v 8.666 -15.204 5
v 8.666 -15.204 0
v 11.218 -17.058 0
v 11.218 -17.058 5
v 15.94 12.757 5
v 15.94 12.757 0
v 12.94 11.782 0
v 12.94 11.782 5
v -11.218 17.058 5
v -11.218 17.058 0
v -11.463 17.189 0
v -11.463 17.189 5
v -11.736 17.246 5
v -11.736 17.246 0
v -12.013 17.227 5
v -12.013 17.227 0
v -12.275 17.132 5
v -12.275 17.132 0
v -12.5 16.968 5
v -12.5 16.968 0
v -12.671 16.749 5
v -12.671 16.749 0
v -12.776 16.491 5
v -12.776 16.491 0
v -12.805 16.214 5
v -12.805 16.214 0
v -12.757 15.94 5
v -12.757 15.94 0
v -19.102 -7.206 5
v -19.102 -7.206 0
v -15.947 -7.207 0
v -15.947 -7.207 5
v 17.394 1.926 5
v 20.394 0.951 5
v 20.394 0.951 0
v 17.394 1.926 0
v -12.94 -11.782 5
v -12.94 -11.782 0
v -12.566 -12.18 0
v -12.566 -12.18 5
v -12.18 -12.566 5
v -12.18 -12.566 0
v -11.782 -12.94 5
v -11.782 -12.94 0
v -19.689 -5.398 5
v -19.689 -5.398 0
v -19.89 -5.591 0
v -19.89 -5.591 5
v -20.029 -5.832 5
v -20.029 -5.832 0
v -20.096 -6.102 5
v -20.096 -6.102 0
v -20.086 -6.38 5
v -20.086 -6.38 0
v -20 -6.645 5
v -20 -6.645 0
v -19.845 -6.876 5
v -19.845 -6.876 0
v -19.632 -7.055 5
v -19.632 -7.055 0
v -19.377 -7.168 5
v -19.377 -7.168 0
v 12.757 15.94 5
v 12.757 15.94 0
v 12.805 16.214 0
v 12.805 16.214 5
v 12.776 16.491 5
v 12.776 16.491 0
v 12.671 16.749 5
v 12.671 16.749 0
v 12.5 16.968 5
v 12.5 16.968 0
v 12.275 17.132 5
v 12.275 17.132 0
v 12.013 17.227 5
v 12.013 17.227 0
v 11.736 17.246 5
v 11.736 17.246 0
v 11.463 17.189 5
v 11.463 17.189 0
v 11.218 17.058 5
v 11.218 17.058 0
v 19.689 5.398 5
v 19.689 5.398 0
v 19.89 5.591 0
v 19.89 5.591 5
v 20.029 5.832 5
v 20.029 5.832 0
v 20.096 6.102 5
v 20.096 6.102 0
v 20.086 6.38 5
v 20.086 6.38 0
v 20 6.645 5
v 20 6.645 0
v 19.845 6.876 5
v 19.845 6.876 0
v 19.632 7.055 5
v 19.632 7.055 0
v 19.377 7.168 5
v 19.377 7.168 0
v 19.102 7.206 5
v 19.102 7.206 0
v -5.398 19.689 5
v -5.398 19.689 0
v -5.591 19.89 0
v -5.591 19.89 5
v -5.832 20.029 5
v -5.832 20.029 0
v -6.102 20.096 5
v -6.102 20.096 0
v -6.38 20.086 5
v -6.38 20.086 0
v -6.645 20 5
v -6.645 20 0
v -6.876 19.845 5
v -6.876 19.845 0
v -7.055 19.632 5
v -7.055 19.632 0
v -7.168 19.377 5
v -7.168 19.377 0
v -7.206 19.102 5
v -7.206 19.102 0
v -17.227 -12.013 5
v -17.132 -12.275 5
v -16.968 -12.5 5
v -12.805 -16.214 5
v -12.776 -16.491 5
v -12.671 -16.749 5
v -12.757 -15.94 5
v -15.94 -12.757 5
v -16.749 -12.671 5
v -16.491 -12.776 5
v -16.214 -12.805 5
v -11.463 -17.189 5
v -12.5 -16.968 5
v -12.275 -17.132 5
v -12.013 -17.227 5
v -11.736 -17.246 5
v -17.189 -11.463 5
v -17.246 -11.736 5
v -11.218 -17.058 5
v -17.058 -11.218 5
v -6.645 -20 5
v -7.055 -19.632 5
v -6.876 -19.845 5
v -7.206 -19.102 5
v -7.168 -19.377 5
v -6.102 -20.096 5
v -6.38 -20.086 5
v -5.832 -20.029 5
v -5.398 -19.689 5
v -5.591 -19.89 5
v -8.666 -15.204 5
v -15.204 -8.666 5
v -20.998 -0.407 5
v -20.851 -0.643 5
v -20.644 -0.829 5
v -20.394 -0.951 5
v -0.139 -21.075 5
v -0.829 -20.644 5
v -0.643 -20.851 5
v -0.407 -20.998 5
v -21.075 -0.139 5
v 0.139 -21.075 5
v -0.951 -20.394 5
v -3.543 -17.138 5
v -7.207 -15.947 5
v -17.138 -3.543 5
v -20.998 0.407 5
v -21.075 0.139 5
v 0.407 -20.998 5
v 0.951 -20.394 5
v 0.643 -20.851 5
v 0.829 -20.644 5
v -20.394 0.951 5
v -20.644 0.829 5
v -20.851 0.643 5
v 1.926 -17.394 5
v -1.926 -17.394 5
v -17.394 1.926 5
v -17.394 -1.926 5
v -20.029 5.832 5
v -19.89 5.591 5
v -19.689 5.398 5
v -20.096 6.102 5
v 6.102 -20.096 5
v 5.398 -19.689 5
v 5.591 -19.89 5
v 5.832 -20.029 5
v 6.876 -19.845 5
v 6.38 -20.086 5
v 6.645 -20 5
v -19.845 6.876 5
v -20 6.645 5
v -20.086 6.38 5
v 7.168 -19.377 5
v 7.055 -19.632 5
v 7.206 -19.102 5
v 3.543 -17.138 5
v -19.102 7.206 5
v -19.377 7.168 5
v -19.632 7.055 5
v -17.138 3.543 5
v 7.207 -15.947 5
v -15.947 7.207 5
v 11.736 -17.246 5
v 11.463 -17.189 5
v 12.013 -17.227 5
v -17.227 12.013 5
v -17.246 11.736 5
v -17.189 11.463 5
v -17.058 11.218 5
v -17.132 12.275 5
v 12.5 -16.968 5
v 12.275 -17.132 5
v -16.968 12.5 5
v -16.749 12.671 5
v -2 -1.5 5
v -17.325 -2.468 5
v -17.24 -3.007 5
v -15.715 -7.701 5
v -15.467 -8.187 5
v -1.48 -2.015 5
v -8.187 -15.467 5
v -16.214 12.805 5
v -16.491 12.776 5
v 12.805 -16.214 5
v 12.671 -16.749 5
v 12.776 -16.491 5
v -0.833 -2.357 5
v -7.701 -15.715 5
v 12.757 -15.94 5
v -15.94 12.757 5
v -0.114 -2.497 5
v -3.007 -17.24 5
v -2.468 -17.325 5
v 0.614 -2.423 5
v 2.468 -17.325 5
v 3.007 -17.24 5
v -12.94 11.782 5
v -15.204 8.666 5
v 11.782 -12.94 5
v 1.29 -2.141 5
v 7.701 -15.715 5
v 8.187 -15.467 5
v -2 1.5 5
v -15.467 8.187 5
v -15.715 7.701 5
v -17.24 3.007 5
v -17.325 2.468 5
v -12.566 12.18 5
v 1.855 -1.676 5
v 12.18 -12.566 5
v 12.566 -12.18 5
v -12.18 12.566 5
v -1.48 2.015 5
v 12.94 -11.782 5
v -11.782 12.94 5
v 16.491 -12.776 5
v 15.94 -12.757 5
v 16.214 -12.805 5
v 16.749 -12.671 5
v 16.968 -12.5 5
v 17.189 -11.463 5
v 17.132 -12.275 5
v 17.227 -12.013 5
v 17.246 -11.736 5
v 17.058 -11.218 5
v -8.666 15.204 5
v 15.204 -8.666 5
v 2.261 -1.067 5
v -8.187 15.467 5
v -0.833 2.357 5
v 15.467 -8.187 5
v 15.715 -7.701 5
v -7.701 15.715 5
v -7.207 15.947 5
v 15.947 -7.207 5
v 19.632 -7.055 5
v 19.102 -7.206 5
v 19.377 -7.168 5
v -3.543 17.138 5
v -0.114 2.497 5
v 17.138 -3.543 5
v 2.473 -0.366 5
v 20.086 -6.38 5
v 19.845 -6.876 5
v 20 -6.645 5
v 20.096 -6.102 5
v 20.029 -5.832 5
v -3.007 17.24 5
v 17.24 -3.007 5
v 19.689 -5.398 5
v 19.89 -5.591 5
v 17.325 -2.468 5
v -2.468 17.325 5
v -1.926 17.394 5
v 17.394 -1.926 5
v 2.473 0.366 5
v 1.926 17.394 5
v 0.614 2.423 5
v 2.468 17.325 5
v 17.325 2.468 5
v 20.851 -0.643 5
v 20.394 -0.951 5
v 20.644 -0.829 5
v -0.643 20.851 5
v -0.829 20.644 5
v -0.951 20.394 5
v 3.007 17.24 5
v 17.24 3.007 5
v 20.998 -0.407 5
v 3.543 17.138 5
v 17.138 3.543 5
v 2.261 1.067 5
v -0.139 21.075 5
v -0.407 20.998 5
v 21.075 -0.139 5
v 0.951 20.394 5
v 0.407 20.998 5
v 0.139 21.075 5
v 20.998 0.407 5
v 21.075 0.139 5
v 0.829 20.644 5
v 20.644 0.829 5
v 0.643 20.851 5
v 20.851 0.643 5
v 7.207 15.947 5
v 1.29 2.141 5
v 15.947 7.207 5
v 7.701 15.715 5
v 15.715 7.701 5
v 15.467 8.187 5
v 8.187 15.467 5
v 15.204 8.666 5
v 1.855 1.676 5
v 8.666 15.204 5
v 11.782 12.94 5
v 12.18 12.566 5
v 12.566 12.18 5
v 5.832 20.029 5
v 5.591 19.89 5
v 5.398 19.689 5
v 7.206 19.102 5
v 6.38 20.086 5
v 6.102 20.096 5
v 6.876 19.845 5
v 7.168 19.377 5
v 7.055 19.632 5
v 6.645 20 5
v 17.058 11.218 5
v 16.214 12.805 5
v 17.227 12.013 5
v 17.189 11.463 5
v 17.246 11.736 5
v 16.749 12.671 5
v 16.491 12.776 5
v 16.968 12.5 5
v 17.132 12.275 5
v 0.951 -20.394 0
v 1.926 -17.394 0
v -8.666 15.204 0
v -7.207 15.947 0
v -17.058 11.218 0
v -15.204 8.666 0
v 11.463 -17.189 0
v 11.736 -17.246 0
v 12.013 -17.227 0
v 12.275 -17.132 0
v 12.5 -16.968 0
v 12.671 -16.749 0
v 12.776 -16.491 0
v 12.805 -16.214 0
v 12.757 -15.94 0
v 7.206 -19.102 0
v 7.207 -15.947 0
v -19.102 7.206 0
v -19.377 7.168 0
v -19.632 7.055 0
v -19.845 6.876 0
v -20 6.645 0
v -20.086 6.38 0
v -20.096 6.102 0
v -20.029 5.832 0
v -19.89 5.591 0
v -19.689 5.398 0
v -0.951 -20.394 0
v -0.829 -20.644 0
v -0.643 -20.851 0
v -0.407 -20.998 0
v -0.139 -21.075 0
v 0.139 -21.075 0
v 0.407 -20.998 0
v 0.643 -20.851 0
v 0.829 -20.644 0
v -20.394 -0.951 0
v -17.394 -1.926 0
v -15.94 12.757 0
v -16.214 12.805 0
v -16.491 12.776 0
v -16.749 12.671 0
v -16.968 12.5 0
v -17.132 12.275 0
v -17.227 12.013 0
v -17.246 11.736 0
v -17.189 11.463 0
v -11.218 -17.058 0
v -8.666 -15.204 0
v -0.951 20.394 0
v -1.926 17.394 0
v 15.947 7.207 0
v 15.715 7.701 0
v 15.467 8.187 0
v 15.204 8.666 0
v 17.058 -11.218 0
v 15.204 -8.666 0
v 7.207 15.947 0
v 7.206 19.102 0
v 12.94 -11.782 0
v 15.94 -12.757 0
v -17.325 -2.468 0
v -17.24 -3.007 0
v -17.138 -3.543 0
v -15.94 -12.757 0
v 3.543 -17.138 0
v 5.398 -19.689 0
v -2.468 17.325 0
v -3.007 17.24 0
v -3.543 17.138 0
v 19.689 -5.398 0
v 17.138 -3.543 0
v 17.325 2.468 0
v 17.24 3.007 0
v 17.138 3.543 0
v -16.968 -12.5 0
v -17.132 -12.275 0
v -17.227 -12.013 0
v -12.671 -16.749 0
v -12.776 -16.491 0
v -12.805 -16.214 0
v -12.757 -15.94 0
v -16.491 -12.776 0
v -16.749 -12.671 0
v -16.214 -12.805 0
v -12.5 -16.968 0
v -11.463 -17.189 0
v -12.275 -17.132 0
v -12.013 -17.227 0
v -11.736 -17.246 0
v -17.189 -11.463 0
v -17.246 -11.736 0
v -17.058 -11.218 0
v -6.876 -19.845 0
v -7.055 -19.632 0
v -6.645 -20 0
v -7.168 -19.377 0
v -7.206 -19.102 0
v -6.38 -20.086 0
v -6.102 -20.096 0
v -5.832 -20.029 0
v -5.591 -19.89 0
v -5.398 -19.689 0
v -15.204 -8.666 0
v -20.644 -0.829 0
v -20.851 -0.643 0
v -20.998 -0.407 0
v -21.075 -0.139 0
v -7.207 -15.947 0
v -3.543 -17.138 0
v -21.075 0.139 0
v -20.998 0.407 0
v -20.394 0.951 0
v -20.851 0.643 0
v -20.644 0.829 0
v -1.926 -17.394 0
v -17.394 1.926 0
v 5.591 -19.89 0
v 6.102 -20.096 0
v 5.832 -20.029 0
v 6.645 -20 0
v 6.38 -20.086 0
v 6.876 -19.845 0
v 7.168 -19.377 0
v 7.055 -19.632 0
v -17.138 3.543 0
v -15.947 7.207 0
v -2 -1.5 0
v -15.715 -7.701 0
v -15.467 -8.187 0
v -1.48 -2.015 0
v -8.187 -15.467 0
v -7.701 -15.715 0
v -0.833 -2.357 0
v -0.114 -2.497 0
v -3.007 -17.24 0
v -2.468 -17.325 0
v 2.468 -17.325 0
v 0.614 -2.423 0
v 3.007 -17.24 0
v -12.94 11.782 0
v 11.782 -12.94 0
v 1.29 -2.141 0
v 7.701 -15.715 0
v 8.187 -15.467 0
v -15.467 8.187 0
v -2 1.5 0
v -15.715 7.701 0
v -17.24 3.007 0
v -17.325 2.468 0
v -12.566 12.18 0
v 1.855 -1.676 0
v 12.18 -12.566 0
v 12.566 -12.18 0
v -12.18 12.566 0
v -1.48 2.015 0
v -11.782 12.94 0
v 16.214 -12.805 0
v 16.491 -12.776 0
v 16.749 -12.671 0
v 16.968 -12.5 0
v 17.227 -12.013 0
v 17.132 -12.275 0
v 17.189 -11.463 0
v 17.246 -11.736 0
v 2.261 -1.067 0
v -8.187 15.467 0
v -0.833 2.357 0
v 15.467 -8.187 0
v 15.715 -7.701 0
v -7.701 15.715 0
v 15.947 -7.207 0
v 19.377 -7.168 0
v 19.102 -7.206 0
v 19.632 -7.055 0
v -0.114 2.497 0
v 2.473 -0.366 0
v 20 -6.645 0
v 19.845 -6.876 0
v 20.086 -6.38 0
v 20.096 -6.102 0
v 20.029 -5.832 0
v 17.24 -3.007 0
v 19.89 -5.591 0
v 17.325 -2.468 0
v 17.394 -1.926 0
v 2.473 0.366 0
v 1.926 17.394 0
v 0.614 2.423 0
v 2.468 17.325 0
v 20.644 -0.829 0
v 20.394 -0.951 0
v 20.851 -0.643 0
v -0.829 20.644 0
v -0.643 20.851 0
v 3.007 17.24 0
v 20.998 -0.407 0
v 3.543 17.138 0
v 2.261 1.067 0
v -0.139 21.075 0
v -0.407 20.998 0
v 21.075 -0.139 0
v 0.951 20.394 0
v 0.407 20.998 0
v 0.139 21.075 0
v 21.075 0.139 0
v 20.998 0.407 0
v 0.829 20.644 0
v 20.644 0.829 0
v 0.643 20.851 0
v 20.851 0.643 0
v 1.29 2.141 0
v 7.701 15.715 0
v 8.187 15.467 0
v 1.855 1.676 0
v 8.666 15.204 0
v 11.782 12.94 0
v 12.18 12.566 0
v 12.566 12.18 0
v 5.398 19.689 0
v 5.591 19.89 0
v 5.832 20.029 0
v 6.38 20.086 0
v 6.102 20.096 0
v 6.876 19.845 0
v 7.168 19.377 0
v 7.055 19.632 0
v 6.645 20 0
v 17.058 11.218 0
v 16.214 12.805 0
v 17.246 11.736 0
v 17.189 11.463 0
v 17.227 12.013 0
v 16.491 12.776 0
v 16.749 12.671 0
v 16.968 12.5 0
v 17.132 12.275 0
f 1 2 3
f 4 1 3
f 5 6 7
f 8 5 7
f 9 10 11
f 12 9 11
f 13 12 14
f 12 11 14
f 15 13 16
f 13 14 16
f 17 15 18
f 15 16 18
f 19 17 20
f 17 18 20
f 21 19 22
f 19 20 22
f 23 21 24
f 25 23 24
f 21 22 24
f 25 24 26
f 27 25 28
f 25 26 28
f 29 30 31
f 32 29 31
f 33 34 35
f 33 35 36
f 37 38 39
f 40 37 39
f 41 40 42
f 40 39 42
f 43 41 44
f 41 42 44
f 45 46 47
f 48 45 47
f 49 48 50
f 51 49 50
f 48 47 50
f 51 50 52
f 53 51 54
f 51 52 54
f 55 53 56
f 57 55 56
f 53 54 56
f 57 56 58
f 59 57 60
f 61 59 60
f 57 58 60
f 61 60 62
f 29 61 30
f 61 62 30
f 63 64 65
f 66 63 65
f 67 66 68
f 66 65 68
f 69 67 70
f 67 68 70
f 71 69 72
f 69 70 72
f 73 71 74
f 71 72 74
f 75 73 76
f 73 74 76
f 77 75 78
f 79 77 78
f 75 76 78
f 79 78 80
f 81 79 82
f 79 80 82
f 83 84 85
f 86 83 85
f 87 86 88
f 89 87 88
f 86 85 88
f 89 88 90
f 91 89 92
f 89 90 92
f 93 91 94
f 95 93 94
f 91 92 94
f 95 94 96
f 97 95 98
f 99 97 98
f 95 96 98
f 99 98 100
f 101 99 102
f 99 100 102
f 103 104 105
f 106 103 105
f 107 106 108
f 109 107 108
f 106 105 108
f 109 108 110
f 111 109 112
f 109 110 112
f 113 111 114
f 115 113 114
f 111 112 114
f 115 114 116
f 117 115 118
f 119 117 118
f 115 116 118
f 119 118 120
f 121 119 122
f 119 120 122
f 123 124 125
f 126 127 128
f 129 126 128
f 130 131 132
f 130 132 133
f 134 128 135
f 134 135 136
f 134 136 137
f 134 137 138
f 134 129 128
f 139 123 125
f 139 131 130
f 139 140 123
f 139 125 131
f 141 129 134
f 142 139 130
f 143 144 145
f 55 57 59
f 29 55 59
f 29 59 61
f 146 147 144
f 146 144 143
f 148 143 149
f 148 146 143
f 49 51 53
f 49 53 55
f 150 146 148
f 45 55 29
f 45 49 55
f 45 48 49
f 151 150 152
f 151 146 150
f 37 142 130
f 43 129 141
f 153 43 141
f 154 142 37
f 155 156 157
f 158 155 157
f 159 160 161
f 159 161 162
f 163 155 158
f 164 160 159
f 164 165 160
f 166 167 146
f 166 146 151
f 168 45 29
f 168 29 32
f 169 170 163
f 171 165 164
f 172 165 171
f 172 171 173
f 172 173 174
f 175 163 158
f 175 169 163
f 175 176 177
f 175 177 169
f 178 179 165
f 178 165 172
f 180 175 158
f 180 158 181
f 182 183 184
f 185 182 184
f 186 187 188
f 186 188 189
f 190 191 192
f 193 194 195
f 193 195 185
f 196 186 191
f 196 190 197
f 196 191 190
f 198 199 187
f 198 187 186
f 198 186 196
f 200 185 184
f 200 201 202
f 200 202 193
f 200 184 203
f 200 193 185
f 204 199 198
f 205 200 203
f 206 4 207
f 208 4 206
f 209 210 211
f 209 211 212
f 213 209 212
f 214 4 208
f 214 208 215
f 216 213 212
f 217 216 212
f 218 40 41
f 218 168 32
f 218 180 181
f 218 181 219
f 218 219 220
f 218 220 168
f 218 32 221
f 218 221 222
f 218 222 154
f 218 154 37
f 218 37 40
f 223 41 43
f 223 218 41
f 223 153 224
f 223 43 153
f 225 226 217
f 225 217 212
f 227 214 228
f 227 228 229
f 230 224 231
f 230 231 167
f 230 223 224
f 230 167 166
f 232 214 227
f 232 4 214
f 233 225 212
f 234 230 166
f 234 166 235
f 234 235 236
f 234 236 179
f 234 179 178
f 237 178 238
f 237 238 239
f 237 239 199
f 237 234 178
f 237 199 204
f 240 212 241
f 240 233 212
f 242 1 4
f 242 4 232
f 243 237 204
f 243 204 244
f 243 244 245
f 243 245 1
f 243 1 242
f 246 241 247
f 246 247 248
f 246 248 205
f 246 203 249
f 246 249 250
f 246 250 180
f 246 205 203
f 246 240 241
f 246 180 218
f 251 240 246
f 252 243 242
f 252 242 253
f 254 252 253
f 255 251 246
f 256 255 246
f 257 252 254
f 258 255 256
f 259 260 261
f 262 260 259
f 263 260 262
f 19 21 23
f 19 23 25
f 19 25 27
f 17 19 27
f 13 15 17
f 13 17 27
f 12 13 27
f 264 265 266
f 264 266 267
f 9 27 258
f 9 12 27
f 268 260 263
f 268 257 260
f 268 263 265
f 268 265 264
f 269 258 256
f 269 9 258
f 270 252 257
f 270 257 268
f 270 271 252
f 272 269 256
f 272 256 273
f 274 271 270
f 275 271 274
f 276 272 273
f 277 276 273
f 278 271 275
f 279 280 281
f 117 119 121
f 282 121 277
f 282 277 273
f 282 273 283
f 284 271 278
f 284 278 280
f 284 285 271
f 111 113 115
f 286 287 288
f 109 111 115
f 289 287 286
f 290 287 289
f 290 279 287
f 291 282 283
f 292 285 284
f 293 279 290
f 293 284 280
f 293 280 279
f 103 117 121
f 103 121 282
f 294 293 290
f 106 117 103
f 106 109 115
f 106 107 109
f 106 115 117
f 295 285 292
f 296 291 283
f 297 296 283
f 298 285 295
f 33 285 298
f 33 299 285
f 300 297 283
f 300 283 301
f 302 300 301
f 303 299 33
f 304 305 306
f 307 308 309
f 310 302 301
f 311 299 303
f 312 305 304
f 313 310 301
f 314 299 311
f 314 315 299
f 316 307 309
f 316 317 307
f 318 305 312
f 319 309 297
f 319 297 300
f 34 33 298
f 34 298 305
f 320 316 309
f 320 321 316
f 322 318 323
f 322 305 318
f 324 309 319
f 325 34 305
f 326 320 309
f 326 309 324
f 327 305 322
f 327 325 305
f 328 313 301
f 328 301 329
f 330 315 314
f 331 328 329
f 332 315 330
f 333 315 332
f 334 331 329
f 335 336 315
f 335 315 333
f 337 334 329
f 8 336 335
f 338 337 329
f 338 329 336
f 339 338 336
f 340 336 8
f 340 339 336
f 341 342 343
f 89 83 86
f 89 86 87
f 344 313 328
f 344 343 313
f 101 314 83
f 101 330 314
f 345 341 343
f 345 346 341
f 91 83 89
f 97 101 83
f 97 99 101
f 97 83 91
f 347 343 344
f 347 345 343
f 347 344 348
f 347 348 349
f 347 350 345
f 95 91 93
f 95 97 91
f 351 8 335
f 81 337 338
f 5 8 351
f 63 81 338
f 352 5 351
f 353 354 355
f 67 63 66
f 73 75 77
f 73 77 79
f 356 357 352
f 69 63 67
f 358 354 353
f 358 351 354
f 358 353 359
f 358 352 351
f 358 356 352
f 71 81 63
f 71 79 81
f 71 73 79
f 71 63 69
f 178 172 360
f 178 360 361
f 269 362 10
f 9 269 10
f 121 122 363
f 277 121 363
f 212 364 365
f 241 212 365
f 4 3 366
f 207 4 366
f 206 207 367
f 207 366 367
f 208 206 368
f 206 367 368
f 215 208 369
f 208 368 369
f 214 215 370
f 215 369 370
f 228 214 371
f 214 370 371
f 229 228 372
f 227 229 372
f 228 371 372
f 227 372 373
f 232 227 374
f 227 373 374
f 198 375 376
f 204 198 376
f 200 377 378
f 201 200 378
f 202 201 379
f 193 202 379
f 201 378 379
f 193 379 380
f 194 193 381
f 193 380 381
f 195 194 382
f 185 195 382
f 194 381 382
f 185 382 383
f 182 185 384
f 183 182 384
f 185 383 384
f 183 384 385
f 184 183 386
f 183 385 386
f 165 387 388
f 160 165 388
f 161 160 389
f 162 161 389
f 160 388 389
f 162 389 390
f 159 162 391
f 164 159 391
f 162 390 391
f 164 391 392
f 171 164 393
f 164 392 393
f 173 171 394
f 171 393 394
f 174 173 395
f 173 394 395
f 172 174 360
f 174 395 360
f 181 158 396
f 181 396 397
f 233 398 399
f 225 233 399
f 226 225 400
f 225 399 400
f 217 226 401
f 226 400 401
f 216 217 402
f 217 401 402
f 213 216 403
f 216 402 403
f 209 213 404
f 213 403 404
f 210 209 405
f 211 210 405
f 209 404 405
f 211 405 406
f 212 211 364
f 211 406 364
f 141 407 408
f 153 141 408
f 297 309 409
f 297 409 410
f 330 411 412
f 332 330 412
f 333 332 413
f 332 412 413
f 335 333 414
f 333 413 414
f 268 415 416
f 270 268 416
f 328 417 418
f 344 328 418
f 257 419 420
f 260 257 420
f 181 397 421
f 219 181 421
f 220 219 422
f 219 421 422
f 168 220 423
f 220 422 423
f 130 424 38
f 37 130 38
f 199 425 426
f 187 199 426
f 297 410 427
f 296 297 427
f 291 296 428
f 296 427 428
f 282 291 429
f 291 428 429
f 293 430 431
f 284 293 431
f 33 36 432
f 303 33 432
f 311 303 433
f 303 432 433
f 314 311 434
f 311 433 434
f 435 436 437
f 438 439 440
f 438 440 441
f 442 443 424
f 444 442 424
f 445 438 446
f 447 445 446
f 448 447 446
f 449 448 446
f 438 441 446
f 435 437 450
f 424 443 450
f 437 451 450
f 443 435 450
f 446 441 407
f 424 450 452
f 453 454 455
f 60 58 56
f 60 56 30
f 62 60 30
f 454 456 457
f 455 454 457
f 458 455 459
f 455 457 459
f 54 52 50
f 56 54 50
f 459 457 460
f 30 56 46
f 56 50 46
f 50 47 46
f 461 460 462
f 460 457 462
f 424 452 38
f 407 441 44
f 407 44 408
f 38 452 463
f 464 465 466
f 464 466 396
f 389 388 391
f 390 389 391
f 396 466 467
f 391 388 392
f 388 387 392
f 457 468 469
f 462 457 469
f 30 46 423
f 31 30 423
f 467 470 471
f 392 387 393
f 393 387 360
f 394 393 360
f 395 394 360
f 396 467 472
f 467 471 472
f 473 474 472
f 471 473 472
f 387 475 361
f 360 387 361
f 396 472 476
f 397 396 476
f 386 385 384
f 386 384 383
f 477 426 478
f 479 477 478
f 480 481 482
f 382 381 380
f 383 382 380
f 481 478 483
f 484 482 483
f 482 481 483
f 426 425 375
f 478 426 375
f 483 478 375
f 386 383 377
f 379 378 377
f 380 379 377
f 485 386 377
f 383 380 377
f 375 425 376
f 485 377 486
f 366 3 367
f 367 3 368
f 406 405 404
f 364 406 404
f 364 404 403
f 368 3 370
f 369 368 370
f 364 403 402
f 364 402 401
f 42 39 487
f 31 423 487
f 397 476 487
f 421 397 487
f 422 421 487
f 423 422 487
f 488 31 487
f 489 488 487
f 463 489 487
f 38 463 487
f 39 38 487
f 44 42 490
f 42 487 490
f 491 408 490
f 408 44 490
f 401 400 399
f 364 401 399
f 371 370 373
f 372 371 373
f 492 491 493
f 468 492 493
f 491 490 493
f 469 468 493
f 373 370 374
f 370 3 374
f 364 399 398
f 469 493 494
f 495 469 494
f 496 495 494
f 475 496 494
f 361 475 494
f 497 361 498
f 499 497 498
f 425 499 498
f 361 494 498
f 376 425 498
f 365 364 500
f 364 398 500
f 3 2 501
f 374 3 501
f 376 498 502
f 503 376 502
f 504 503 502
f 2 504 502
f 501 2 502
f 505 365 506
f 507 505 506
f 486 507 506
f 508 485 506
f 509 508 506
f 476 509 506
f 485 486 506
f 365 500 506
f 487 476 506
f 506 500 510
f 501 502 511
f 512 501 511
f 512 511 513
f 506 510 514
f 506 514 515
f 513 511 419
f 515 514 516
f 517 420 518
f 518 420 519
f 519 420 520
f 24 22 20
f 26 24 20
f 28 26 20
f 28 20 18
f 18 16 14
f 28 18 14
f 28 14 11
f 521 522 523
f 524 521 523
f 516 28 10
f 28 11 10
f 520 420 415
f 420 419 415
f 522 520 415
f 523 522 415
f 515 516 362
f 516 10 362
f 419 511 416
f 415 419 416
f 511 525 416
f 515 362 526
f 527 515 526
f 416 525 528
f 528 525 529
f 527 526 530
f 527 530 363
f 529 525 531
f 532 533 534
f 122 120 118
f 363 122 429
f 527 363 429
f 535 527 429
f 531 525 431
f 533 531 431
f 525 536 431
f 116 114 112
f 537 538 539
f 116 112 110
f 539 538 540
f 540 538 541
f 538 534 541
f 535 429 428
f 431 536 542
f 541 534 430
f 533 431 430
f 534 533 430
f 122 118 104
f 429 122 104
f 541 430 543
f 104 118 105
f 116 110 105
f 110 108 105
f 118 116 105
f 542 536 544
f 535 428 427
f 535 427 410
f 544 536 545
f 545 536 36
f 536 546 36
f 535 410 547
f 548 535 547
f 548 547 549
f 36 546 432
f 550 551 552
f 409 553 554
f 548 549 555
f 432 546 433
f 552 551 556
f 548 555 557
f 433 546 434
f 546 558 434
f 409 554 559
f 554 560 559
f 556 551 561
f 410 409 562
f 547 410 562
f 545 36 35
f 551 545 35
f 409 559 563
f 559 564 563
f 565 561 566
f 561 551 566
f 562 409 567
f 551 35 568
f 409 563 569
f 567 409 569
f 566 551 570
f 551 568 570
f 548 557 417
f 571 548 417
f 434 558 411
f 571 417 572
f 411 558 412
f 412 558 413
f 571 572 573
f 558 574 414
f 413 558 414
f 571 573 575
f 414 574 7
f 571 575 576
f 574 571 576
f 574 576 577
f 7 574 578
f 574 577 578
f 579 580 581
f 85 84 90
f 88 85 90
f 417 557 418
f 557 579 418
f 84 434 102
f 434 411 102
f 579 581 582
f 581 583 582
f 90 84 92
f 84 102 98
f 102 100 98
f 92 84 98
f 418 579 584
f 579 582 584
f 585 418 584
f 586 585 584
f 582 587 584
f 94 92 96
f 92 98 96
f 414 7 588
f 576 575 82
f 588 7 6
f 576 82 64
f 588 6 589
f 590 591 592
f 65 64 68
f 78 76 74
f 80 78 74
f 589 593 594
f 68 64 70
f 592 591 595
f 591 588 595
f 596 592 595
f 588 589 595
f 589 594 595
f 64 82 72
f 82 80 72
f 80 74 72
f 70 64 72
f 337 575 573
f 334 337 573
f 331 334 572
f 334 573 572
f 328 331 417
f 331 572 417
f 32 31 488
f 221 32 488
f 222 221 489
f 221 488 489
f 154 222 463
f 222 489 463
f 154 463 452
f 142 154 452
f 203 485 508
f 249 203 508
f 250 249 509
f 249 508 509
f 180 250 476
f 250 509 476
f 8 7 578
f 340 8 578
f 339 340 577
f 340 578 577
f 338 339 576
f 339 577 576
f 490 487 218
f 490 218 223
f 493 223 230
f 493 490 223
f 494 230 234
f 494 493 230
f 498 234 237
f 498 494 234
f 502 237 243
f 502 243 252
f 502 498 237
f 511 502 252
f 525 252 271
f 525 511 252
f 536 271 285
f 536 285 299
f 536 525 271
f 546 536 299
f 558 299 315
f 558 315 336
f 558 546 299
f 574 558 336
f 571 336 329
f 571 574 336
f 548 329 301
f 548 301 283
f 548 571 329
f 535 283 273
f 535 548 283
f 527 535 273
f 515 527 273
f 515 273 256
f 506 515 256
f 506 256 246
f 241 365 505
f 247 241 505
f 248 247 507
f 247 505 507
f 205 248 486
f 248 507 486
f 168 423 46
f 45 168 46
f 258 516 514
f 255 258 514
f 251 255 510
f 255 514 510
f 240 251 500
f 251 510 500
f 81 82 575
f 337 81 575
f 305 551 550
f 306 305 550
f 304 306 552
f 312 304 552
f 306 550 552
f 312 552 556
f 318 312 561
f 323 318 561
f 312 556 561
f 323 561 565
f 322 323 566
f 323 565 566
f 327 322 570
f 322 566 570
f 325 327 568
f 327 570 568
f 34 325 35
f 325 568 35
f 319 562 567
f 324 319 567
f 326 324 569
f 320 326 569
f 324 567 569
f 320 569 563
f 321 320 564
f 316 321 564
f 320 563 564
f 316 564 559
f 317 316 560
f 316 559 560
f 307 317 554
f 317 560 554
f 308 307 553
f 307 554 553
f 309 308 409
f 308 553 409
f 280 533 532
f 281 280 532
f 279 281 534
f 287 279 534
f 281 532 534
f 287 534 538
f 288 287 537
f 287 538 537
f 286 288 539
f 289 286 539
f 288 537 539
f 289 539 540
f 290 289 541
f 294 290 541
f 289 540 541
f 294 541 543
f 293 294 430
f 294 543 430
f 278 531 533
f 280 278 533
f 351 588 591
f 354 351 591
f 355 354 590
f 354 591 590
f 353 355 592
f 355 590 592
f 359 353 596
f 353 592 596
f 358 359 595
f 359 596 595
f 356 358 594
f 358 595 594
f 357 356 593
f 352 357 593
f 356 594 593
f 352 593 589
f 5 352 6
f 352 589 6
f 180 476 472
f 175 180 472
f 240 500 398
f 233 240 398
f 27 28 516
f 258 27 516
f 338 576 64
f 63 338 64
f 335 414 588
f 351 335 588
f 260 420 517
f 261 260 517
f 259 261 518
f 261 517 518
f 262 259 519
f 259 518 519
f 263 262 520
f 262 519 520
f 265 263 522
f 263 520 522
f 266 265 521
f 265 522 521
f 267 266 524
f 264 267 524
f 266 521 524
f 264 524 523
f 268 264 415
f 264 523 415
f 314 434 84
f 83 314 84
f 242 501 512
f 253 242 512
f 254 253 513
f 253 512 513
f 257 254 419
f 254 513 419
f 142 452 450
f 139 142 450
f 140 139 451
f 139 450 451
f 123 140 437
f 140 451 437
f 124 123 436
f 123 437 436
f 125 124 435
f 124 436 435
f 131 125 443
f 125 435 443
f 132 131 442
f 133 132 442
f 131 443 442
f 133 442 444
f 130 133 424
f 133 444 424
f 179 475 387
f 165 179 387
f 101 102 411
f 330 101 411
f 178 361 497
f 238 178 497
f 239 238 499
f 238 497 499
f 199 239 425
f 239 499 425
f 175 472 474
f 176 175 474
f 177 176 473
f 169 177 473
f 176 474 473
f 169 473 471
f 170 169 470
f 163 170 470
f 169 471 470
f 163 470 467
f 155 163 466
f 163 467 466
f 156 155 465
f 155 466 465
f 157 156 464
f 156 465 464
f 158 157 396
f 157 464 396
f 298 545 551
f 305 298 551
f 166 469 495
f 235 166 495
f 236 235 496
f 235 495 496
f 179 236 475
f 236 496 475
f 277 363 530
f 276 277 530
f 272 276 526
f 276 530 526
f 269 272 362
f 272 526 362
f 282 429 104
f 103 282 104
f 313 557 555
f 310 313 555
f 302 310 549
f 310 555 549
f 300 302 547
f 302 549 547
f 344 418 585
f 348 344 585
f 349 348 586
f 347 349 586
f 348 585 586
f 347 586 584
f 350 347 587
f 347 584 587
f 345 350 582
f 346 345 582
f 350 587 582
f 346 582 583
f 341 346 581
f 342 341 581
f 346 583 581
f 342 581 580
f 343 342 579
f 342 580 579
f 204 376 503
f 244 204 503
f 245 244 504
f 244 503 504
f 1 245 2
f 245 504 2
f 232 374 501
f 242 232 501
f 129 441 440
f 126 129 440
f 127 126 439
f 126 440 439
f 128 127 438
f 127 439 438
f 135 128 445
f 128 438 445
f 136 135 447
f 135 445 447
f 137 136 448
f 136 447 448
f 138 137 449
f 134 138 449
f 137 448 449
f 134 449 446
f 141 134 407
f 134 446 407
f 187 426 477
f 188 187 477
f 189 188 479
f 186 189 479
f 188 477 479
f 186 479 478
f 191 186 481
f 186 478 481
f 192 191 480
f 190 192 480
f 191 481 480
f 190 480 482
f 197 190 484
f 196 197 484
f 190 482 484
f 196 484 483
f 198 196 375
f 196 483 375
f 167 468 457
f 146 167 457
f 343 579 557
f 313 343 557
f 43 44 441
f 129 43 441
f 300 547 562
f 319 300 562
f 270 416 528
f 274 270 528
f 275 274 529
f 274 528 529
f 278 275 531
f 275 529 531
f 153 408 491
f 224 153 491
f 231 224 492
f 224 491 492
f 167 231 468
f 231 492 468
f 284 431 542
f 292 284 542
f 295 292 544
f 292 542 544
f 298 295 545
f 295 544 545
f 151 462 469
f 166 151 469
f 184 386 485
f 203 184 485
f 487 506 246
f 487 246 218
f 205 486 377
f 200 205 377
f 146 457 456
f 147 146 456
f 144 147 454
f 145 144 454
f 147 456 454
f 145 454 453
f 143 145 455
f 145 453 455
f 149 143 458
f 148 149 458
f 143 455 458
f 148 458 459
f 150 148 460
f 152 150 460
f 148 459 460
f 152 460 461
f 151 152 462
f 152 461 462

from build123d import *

# Parameters (mm, degrees)
DODANIE_WYCI_GNI_CIE1_DEPTH = 5


with BuildPart() as part:
    # Szkic1 → Dodanie-wyciągnięcie1 (new body)
    with BuildSketch(Plane.XY):
        with BuildLine():
            Line((-0.951045555, 20.39370068), (-1.925922284, 17.39370068))
            ThreePointArc((-1.925922284, 17.39370068), (-2.737603138, 17.28454596), (-3.543288168, 17.13753509))
            Line((-3.543288168, 17.13753509), (-5.397502016, 19.689451162))
            ThreePointArc((-5.397502016, 19.689451162), (-6.515515156, 20.052693732), (-7.206498161, 19.101672684))
            Line((-7.206498161, 19.101672684), (-7.206610043, 15.947249659))
            ThreePointArc((-7.206610043, 15.947249659), (-7.944833745, 15.592614173), (-8.665656885, 15.203828161))
            Line((-8.665656885, 15.203828161), (-11.217704483, 17.05786098))
            ThreePointArc((-11.217704483, 17.05786098), (-12.393246293, 17.057840133), (-12.756528516, 15.939839877))
            Line((-12.756528516, 15.939839877), (-11.7818646, 12.93977073))
            ThreePointArc((-11.7818646, 12.93977073), (-12.374368671, 12.374368671), (-12.93977073, 11.7818646))
            Line((-12.93977073, 11.7818646), (-15.939839877, 12.756528516))
            ThreePointArc((-15.939839877, 12.756528516), (-17.057840133, 12.393246293), (-17.05786098, 11.217704483))
            Line((-17.05786098, 11.217704483), (-15.203828161, 8.665656885))
            ThreePointArc((-15.203828161, 8.665656885), (-15.592614173, 7.944833745), (-15.947249659, 7.206610043))
            Line((-15.947249659, 7.206610043), (-19.101672684, 7.206498161))
            ThreePointArc((-19.101672684, 7.206498161), (-20.052693732, 6.515515156), (-19.689451162, 5.397502016))
            Line((-19.689451162, 5.397502016), (-17.13753509, 3.543288168))
            ThreePointArc((-17.13753509, 3.543288168), (-17.28454596, 2.737603138), (-17.39370068, 1.925922284))
            Line((-17.39370068, 1.925922284), (-20.39370068, 0.951045555))
            ThreePointArc((-20.39370068, 0.951045555), (-21.084649954, 0), (-20.39370068, -0.951045555))
            Line((-20.39370068, -0.951045555), (-17.39370068, -1.925922284))
            ThreePointArc((-17.39370068, -1.925922284), (-17.28454596, -2.737603138), (-17.13753509, -3.543288168))
            Line((-17.13753509, -3.543288168), (-19.689451162, -5.397502016))
            ThreePointArc((-19.689451162, -5.397502016), (-20.052693732, -6.515515156), (-19.101672684, -7.206498161))
            Line((-19.101672684, -7.206498161), (-15.947249659, -7.206610043))
            ThreePointArc((-15.947249659, -7.206610043), (-15.592614173, -7.944833745), (-15.203828161, -8.665656885))
            Line((-15.203828161, -8.665656885), (-17.05786098, -11.217704483))
            ThreePointArc((-17.05786098, -11.217704483), (-17.057840133, -12.393246293), (-15.939839877, -12.756528516))
            Line((-15.939839877, -12.756528516), (-12.93977073, -11.7818646))
            ThreePointArc((-12.93977073, -11.7818646), (-12.374368671, -12.374368671), (-11.7818646, -12.93977073))
            Line((-11.7818646, -12.93977073), (-12.756528516, -15.939839877))
            ThreePointArc((-12.756528516, -15.939839877), (-12.393246293, -17.057840133), (-11.217704483, -17.05786098))
            Line((-11.217704483, -17.05786098), (-8.665656885, -15.203828161))
            ThreePointArc((-8.665656885, -15.203828161), (-7.944833745, -15.592614173), (-7.206610043, -15.947249659))
            Line((-7.206610043, -15.947249659), (-7.206498161, -19.101672684))
            ThreePointArc((-7.206498161, -19.101672684), (-6.515515156, -20.052693732), (-5.397502016, -19.689451162))
            Line((-5.397502016, -19.689451162), (-3.543288168, -17.13753509))
            ThreePointArc((-3.543288168, -17.13753509), (-2.737603138, -17.28454596), (-1.925922284, -17.39370068))
            Line((-1.925922284, -17.39370068), (-0.951045555, -20.39370068))
            ThreePointArc((-0.951045555, -20.39370068), (0, -21.084649954), (0.951045555, -20.39370068))
            Line((0.951045555, -20.39370068), (1.925922284, -17.39370068))
            ThreePointArc((1.925922284, -17.39370068), (2.737603138, -17.28454596), (3.543288168, -17.13753509))
            Line((3.543288168, -17.13753509), (5.397502016, -19.689451162))
            ThreePointArc((5.397502016, -19.689451162), (6.515515156, -20.052693732), (7.206498161, -19.101672684))
            Line((7.206498161, -19.101672684), (7.206610043, -15.947249659))
            ThreePointArc((7.206610043, -15.947249659), (7.944833745, -15.592614173), (8.665656885, -15.203828161))
            Line((8.665656885, -15.203828161), (11.217704483, -17.05786098))
            ThreePointArc((11.217704483, -17.05786098), (12.393246293, -17.057840133), (12.756528516, -15.939839877))
            Line((12.756528516, -15.939839877), (11.7818646, -12.93977073))
            ThreePointArc((11.7818646, -12.93977073), (12.374368671, -12.374368671), (12.93977073, -11.7818646))
            Line((12.93977073, -11.7818646), (15.939839877, -12.756528516))
            ThreePointArc((15.939839877, -12.756528516), (17.057840133, -12.393246293), (17.05786098, -11.217704483))
            Line((17.05786098, -11.217704483), (15.203828161, -8.665656885))
            ThreePointArc((15.203828161, -8.665656885), (15.592614173, -7.944833745), (15.947249659, -7.206610043))
            Line((15.947249659, -7.206610043), (19.101672684, -7.206498161))
            ThreePointArc((19.101672684, -7.206498161), (20.052693732, -6.515515156), (19.689451162, -5.397502016))
            Line((19.689451162, -5.397502016), (17.13753509, -3.543288168))
            ThreePointArc((17.13753509, -3.543288168), (17.28454596, -2.737603138), (17.39370068, -1.925922284))
            Line((17.39370068, -1.925922284), (20.39370068, -0.951045555))
            ThreePointArc((20.39370068, -0.951045555), (21.084649954, 0), (20.39370068, 0.951045555))
            Line((20.39370068, 0.951045555), (17.39370068, 1.925922284))
            ThreePointArc((17.39370068, 1.925922284), (17.28454596, 2.737603138), (17.13753509, 3.543288168))
            Line((17.13753509, 3.543288168), (19.689451162, 5.397502016))
            ThreePointArc((19.689451162, 5.397502016), (20.052693732, 6.515515156), (19.101672684, 7.206498161))
            Line((19.101672684, 7.206498161), (15.947249659, 7.206610043))
            ThreePointArc((15.947249659, 7.206610043), (15.592614173, 7.944833745), (15.203828161, 8.665656885))
            Line((15.203828161, 8.665656885), (17.05786098, 11.217704483))
            ThreePointArc((17.05786098, 11.217704483), (17.057840133, 12.393246293), (15.939839877, 12.756528516))
            Line((15.939839877, 12.756528516), (12.93977073, 11.7818646))
            ThreePointArc((12.93977073, 11.7818646), (12.374368671, 12.374368671), (11.7818646, 12.93977073))
            Line((11.7818646, 12.93977073), (12.756528516, 15.939839877))
            ThreePointArc((12.756528516, 15.939839877), (12.393246293, 17.057840133), (11.217704483, 17.05786098))
            Line((11.217704483, 17.05786098), (8.665656885, 15.203828161))
            ThreePointArc((8.665656885, 15.203828161), (7.944833745, 15.592614173), (7.206610043, 15.947249659))
            Line((7.206610043, 15.947249659), (7.206498161, 19.101672684))
            ThreePointArc((7.206498161, 19.101672684), (6.515515156, 20.052693732), (5.397502016, 19.689451162))
            Line((5.397502016, 19.689451162), (3.543288168, 17.13753509))
            ThreePointArc((3.543288168, 17.13753509), (2.737603138, 17.28454596), (1.925922284, 17.39370068))
            Line((1.925922284, 17.39370068), (0.951045555, 20.39370068))
            ThreePointArc((0.951045555, 20.39370068), (0, 21.084649954), (-0.951045555, 20.39370068))
        make_face()
        with BuildLine():
            Line((-2, 1.5), (-2, -1.5))
            ThreePointArc((-2, -1.5), (2.5, 0), (-2, 1.5))
        make_face(mode=Mode.SUBTRACT)
    extrude(amount=DODANIE_WYCI_GNI_CIE1_DEPTH)


solid = part.part
